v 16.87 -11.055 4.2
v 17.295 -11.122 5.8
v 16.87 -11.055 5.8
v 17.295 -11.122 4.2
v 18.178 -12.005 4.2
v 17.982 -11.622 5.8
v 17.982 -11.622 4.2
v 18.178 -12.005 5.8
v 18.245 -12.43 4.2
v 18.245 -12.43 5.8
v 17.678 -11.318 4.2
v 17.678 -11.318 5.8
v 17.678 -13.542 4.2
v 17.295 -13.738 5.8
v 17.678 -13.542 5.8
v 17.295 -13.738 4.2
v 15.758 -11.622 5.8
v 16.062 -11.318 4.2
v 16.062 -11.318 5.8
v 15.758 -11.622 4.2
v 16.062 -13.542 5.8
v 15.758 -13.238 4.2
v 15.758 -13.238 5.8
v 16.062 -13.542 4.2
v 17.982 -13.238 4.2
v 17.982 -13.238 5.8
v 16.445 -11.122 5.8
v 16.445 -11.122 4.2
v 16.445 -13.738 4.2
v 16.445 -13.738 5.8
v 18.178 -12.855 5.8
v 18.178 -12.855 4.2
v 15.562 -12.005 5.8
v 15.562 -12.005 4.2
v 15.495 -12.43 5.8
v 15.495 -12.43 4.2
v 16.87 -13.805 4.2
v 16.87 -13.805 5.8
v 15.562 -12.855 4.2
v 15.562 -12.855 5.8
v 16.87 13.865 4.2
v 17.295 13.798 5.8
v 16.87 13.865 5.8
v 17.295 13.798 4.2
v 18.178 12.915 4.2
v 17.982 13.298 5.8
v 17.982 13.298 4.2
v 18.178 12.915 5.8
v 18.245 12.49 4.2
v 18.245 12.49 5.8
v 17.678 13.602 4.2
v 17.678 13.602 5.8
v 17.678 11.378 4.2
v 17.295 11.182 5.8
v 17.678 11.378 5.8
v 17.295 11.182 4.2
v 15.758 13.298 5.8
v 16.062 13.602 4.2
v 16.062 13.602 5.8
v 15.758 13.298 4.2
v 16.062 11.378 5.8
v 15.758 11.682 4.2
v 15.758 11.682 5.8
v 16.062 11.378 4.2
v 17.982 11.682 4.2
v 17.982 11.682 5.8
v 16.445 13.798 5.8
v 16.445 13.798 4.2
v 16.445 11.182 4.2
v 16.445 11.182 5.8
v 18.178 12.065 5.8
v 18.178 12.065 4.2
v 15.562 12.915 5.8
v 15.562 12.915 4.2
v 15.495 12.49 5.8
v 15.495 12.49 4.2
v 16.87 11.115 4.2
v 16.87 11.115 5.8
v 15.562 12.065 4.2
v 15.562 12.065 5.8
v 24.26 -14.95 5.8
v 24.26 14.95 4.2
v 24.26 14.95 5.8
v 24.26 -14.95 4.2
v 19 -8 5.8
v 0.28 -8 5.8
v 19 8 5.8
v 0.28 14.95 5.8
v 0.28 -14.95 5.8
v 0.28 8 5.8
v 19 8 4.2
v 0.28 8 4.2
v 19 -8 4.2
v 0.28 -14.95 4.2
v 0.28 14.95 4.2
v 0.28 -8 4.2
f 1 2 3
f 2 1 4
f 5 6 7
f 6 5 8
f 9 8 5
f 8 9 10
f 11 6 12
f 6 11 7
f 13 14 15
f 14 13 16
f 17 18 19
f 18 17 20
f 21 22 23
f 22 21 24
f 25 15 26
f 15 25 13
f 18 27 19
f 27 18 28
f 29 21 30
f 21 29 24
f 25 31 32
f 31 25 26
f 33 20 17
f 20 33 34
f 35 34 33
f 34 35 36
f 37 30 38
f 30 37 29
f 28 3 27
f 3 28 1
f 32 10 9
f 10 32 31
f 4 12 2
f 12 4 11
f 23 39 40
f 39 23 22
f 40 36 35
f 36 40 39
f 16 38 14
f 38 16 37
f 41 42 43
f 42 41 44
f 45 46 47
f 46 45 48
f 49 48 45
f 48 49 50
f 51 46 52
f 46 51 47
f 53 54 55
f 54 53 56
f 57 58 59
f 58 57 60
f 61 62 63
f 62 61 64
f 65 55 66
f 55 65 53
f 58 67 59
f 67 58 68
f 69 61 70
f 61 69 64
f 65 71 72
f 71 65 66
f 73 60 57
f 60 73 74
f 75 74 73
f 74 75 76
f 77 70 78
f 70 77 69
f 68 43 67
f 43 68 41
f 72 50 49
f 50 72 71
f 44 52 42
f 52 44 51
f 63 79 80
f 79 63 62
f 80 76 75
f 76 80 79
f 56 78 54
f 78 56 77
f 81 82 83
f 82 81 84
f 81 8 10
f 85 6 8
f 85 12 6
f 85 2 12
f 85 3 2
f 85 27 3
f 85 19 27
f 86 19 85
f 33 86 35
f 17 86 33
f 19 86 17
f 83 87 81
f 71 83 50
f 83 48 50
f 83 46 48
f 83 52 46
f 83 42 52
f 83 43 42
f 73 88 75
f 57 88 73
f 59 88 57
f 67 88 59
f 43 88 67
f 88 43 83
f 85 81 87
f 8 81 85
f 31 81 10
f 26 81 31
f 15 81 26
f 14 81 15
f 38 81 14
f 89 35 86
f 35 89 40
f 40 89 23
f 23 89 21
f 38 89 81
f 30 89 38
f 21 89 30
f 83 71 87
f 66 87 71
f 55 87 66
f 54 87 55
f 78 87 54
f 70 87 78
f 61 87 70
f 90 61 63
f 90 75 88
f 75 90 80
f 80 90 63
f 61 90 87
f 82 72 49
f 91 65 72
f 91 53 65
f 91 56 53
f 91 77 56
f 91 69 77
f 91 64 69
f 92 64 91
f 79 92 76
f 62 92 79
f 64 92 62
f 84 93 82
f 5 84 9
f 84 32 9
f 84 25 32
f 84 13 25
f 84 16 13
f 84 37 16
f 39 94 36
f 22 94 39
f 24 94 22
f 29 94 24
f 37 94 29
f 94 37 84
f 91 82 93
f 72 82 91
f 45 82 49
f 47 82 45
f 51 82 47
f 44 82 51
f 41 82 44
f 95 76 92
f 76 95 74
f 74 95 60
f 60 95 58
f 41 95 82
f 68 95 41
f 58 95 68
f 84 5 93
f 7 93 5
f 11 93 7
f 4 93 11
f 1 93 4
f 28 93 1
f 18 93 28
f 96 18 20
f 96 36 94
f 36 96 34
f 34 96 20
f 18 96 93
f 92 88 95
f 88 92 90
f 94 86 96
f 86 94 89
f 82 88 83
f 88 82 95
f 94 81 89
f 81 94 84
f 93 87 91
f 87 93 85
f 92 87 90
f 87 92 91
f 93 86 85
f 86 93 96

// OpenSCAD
// file: ../../screw-post/screw-post.scad
//-----------------------------------------------------------------------
// Screw post: a round post off the floor that a board screws down onto
//
// Two ways to fix:
//   "nut"  clearance hole through the post and floor; the nut sits in a hex
//          trap in the floor's underside, so the screw goes in from the top
//   "tap"  a pilot hole the screw cuts its own thread in (one or two fittings
//          in PLA/PETG); blind, the floor stays whole underneath
// and "head" for a screw up from below (head in a counterbore, nut on top).
//
// Modules, all in the same frame:
//   screwPostGhost()     the screw (and nut), for previews
//   screwPost()          the post: add to the floor
//   screwPostFloorCut()  subtract from the floor: nut trap / counterbore and hole
//
// Frame: origin on the floor top, on the post's axis. Z up; the floor is
// Z = -floorThick .. 0. Units: mm.
//
// Sizes: "M2", "M2.5", "M3". screwPostScrew(size, ...) says which screw length
// reaches, so a project can assert it has that screw in the kit.
//-----------------------------------------------------------------------

//-- [name, screw Ø, nut across flats, nut thick, head Ø, head height, tap hole, post Ø]
//-- Nuts ISO 4032; heads ISO 7380 button. Tap holes: the usual ~0.8 x Ø for plastic
screwSizes = [
  ["M2",   2.0, 4.0, 1.6, 3.5, 1.1, 1.6, 5.0],
  ["M2.5", 2.5, 5.0, 2.0, 4.4, 1.4, 2.1, 6.0],    // head 4.4: measured on the kit's M2.5 (controller base)
  ["M3",   3.0, 5.5, 2.4, 5.7, 1.65, 2.5, 7.0],
];

screwHoleClear = 0.4;     // added to the screw Ø for a clearance hole
screwNutClear  = 0.3;     // CAL: across flats, nut trap over the nut. Set by the fit piece
screwTapClear  = 0.0;     // CAL: added to the tap hole. Set by the fit piece
screwHeadClear = 0.6;     // counterbore over the head Ø

function screwSize(size) = let (i = search([size], screwSizes)[0])
  assert(i != [] && i != undef, str("unknown screw size ", size)) screwSizes[i];
function screwDia(size)    = screwSize(size)[1];
function screwNutAF(size)  = screwSize(size)[2];
function screwNutH(size)   = screwSize(size)[3];
function screwHeadDia(size)= screwSize(size)[4];
function screwHeadH(size)  = screwSize(size)[5];
function screwPostDia(size)= screwSize(size)[7];

//-- Shortest screw that fills the nut, from the top of the clamped part (h + clamp
//-- above the floor) down to the nut trap's underside. Round up to a length you have.
function screwPostScrew(size, h, floorThick, clamp = 1.6) = h + clamp + floorThick;

module screwPostGhost(size, h, floorThick, clamp = 1.6, length, how = "nut")
{
  d = screwDia(size);
  L = is_undef(length) ? screwPostScrew(size, h, floorThick, clamp) : length;
  top = h + clamp;
  if (how == "head")
  {
    %color("Silver") translate([0, 0, -floorThick]) cylinder(d = screwHeadDia(size), h = screwHeadH(size), $fn = 24);
    %color("Silver") translate([0, 0, -floorThick + screwHeadH(size)]) cylinder(d = d, h = L, $fn = 16);
  }
  else
  {
    %color("Silver") translate([0, 0, top]) cylinder(d = screwHeadDia(size), h = screwHeadH(size), $fn = 24);
    %color("Silver") translate([0, 0, top - L]) cylinder(d = d, h = L, $fn = 16);
    if (how == "nut")
      %color("DimGray") translate([0, 0, -floorThick]) rotate([0, 0, 30]) cylinder(d = screwNutAF(size)/cos(30), h = screwNutH(size), $fn = 6);
  }
}

//-- how: "nut" | "head" (through hole) or "tap" (blind pilot hole). postDia defaults by size
module screwPost(size, h, how = "nut", postDia, tapClear = screwTapClear)
{
  pd = is_undef(postDia) ? screwPostDia(size) : postDia;
  hole = how == "tap" ? screwSize(size)[6] + tapClear : screwDia(size) + screwHoleClear;
  difference()
  {
    translate([0, 0, -0.01]) cylinder(d = pd, h = h + 0.01, $fn = 40);
    translate([0, 0, how == "tap" ? 0.6 : -1]) cylinder(d = hole, h = h + 2, $fn = 24);
    //-- lead-in so the screw starts square
    translate([0, 0, h - 0.4]) cylinder(d1 = hole, d2 = hole + 0.8, h = 0.41, $fn = 24);
  }
}

//-- "nut": hex trap from the underside, opening a little over the nut so it sits flush.
//-- "head": counterbore for the head. "tap": nothing.
module screwPostFloorCut(size, floorThick, how = "nut", nutClear = screwNutClear)
{
  d = screwDia(size) + screwHoleClear;
  if (how == "nut")
  {
    af = screwNutAF(size) + nutClear;
    translate([0, 0, -floorThick - 1]) rotate([0, 0, 30]) cylinder(d = af/cos(30), h = screwNutH(size) + 0.1 + 1, $fn = 6);
    translate([0, 0, -floorThick - 1]) cylinder(d = d + 0.4, h = floorThick + 2, $fn = 24);
  }
  if (how == "head")
  {
    translate([0, 0, -floorThick - 1]) cylinder(d = screwHeadDia(size) + screwHeadClear, h = screwHeadH(size) + 0.2 + 1, $fn = 32);
    translate([0, 0, -floorThick - 1]) cylinder(d = d + 0.4, h = floorThick + 2, $fn = 24);
  }
  assert(how == "tap" || floorThick >= (how == "nut" ? screwNutH(size) : screwHeadH(size)) + 0.1 + 0.3,
         str("floor too thin for the ", size, " ", how));
}
// main file
// The breakout's PCB as a solid, for the catalogue: holes, and the cutout the mid-mount jack drops through.
include <../rj45-breakout.scad>

board = "pihut-106592"; wall = 2.0; postH = 4.2;
b  = rj45Board(board);
j  = rj45JackOf(board);
ex = rj45BoardEdgeX(wall, board);
difference()
{
  translate([ex, -b[2]/2 - b[7], postH]) cube([b[1], b[2], b[3]]);
  for (h = rj45HolesXY(wall, board)) translate([h[0], h[1], postH - 1]) cylinder(d = b[5], h = b[3] + 2, $fn = 20);
  if (j[2] < 0) translate([ex - j[4] - 0.01, -j[1]/2, postH - 1]) cube([j[5] + 0.01, j[1], b[3] + 2]);
}
